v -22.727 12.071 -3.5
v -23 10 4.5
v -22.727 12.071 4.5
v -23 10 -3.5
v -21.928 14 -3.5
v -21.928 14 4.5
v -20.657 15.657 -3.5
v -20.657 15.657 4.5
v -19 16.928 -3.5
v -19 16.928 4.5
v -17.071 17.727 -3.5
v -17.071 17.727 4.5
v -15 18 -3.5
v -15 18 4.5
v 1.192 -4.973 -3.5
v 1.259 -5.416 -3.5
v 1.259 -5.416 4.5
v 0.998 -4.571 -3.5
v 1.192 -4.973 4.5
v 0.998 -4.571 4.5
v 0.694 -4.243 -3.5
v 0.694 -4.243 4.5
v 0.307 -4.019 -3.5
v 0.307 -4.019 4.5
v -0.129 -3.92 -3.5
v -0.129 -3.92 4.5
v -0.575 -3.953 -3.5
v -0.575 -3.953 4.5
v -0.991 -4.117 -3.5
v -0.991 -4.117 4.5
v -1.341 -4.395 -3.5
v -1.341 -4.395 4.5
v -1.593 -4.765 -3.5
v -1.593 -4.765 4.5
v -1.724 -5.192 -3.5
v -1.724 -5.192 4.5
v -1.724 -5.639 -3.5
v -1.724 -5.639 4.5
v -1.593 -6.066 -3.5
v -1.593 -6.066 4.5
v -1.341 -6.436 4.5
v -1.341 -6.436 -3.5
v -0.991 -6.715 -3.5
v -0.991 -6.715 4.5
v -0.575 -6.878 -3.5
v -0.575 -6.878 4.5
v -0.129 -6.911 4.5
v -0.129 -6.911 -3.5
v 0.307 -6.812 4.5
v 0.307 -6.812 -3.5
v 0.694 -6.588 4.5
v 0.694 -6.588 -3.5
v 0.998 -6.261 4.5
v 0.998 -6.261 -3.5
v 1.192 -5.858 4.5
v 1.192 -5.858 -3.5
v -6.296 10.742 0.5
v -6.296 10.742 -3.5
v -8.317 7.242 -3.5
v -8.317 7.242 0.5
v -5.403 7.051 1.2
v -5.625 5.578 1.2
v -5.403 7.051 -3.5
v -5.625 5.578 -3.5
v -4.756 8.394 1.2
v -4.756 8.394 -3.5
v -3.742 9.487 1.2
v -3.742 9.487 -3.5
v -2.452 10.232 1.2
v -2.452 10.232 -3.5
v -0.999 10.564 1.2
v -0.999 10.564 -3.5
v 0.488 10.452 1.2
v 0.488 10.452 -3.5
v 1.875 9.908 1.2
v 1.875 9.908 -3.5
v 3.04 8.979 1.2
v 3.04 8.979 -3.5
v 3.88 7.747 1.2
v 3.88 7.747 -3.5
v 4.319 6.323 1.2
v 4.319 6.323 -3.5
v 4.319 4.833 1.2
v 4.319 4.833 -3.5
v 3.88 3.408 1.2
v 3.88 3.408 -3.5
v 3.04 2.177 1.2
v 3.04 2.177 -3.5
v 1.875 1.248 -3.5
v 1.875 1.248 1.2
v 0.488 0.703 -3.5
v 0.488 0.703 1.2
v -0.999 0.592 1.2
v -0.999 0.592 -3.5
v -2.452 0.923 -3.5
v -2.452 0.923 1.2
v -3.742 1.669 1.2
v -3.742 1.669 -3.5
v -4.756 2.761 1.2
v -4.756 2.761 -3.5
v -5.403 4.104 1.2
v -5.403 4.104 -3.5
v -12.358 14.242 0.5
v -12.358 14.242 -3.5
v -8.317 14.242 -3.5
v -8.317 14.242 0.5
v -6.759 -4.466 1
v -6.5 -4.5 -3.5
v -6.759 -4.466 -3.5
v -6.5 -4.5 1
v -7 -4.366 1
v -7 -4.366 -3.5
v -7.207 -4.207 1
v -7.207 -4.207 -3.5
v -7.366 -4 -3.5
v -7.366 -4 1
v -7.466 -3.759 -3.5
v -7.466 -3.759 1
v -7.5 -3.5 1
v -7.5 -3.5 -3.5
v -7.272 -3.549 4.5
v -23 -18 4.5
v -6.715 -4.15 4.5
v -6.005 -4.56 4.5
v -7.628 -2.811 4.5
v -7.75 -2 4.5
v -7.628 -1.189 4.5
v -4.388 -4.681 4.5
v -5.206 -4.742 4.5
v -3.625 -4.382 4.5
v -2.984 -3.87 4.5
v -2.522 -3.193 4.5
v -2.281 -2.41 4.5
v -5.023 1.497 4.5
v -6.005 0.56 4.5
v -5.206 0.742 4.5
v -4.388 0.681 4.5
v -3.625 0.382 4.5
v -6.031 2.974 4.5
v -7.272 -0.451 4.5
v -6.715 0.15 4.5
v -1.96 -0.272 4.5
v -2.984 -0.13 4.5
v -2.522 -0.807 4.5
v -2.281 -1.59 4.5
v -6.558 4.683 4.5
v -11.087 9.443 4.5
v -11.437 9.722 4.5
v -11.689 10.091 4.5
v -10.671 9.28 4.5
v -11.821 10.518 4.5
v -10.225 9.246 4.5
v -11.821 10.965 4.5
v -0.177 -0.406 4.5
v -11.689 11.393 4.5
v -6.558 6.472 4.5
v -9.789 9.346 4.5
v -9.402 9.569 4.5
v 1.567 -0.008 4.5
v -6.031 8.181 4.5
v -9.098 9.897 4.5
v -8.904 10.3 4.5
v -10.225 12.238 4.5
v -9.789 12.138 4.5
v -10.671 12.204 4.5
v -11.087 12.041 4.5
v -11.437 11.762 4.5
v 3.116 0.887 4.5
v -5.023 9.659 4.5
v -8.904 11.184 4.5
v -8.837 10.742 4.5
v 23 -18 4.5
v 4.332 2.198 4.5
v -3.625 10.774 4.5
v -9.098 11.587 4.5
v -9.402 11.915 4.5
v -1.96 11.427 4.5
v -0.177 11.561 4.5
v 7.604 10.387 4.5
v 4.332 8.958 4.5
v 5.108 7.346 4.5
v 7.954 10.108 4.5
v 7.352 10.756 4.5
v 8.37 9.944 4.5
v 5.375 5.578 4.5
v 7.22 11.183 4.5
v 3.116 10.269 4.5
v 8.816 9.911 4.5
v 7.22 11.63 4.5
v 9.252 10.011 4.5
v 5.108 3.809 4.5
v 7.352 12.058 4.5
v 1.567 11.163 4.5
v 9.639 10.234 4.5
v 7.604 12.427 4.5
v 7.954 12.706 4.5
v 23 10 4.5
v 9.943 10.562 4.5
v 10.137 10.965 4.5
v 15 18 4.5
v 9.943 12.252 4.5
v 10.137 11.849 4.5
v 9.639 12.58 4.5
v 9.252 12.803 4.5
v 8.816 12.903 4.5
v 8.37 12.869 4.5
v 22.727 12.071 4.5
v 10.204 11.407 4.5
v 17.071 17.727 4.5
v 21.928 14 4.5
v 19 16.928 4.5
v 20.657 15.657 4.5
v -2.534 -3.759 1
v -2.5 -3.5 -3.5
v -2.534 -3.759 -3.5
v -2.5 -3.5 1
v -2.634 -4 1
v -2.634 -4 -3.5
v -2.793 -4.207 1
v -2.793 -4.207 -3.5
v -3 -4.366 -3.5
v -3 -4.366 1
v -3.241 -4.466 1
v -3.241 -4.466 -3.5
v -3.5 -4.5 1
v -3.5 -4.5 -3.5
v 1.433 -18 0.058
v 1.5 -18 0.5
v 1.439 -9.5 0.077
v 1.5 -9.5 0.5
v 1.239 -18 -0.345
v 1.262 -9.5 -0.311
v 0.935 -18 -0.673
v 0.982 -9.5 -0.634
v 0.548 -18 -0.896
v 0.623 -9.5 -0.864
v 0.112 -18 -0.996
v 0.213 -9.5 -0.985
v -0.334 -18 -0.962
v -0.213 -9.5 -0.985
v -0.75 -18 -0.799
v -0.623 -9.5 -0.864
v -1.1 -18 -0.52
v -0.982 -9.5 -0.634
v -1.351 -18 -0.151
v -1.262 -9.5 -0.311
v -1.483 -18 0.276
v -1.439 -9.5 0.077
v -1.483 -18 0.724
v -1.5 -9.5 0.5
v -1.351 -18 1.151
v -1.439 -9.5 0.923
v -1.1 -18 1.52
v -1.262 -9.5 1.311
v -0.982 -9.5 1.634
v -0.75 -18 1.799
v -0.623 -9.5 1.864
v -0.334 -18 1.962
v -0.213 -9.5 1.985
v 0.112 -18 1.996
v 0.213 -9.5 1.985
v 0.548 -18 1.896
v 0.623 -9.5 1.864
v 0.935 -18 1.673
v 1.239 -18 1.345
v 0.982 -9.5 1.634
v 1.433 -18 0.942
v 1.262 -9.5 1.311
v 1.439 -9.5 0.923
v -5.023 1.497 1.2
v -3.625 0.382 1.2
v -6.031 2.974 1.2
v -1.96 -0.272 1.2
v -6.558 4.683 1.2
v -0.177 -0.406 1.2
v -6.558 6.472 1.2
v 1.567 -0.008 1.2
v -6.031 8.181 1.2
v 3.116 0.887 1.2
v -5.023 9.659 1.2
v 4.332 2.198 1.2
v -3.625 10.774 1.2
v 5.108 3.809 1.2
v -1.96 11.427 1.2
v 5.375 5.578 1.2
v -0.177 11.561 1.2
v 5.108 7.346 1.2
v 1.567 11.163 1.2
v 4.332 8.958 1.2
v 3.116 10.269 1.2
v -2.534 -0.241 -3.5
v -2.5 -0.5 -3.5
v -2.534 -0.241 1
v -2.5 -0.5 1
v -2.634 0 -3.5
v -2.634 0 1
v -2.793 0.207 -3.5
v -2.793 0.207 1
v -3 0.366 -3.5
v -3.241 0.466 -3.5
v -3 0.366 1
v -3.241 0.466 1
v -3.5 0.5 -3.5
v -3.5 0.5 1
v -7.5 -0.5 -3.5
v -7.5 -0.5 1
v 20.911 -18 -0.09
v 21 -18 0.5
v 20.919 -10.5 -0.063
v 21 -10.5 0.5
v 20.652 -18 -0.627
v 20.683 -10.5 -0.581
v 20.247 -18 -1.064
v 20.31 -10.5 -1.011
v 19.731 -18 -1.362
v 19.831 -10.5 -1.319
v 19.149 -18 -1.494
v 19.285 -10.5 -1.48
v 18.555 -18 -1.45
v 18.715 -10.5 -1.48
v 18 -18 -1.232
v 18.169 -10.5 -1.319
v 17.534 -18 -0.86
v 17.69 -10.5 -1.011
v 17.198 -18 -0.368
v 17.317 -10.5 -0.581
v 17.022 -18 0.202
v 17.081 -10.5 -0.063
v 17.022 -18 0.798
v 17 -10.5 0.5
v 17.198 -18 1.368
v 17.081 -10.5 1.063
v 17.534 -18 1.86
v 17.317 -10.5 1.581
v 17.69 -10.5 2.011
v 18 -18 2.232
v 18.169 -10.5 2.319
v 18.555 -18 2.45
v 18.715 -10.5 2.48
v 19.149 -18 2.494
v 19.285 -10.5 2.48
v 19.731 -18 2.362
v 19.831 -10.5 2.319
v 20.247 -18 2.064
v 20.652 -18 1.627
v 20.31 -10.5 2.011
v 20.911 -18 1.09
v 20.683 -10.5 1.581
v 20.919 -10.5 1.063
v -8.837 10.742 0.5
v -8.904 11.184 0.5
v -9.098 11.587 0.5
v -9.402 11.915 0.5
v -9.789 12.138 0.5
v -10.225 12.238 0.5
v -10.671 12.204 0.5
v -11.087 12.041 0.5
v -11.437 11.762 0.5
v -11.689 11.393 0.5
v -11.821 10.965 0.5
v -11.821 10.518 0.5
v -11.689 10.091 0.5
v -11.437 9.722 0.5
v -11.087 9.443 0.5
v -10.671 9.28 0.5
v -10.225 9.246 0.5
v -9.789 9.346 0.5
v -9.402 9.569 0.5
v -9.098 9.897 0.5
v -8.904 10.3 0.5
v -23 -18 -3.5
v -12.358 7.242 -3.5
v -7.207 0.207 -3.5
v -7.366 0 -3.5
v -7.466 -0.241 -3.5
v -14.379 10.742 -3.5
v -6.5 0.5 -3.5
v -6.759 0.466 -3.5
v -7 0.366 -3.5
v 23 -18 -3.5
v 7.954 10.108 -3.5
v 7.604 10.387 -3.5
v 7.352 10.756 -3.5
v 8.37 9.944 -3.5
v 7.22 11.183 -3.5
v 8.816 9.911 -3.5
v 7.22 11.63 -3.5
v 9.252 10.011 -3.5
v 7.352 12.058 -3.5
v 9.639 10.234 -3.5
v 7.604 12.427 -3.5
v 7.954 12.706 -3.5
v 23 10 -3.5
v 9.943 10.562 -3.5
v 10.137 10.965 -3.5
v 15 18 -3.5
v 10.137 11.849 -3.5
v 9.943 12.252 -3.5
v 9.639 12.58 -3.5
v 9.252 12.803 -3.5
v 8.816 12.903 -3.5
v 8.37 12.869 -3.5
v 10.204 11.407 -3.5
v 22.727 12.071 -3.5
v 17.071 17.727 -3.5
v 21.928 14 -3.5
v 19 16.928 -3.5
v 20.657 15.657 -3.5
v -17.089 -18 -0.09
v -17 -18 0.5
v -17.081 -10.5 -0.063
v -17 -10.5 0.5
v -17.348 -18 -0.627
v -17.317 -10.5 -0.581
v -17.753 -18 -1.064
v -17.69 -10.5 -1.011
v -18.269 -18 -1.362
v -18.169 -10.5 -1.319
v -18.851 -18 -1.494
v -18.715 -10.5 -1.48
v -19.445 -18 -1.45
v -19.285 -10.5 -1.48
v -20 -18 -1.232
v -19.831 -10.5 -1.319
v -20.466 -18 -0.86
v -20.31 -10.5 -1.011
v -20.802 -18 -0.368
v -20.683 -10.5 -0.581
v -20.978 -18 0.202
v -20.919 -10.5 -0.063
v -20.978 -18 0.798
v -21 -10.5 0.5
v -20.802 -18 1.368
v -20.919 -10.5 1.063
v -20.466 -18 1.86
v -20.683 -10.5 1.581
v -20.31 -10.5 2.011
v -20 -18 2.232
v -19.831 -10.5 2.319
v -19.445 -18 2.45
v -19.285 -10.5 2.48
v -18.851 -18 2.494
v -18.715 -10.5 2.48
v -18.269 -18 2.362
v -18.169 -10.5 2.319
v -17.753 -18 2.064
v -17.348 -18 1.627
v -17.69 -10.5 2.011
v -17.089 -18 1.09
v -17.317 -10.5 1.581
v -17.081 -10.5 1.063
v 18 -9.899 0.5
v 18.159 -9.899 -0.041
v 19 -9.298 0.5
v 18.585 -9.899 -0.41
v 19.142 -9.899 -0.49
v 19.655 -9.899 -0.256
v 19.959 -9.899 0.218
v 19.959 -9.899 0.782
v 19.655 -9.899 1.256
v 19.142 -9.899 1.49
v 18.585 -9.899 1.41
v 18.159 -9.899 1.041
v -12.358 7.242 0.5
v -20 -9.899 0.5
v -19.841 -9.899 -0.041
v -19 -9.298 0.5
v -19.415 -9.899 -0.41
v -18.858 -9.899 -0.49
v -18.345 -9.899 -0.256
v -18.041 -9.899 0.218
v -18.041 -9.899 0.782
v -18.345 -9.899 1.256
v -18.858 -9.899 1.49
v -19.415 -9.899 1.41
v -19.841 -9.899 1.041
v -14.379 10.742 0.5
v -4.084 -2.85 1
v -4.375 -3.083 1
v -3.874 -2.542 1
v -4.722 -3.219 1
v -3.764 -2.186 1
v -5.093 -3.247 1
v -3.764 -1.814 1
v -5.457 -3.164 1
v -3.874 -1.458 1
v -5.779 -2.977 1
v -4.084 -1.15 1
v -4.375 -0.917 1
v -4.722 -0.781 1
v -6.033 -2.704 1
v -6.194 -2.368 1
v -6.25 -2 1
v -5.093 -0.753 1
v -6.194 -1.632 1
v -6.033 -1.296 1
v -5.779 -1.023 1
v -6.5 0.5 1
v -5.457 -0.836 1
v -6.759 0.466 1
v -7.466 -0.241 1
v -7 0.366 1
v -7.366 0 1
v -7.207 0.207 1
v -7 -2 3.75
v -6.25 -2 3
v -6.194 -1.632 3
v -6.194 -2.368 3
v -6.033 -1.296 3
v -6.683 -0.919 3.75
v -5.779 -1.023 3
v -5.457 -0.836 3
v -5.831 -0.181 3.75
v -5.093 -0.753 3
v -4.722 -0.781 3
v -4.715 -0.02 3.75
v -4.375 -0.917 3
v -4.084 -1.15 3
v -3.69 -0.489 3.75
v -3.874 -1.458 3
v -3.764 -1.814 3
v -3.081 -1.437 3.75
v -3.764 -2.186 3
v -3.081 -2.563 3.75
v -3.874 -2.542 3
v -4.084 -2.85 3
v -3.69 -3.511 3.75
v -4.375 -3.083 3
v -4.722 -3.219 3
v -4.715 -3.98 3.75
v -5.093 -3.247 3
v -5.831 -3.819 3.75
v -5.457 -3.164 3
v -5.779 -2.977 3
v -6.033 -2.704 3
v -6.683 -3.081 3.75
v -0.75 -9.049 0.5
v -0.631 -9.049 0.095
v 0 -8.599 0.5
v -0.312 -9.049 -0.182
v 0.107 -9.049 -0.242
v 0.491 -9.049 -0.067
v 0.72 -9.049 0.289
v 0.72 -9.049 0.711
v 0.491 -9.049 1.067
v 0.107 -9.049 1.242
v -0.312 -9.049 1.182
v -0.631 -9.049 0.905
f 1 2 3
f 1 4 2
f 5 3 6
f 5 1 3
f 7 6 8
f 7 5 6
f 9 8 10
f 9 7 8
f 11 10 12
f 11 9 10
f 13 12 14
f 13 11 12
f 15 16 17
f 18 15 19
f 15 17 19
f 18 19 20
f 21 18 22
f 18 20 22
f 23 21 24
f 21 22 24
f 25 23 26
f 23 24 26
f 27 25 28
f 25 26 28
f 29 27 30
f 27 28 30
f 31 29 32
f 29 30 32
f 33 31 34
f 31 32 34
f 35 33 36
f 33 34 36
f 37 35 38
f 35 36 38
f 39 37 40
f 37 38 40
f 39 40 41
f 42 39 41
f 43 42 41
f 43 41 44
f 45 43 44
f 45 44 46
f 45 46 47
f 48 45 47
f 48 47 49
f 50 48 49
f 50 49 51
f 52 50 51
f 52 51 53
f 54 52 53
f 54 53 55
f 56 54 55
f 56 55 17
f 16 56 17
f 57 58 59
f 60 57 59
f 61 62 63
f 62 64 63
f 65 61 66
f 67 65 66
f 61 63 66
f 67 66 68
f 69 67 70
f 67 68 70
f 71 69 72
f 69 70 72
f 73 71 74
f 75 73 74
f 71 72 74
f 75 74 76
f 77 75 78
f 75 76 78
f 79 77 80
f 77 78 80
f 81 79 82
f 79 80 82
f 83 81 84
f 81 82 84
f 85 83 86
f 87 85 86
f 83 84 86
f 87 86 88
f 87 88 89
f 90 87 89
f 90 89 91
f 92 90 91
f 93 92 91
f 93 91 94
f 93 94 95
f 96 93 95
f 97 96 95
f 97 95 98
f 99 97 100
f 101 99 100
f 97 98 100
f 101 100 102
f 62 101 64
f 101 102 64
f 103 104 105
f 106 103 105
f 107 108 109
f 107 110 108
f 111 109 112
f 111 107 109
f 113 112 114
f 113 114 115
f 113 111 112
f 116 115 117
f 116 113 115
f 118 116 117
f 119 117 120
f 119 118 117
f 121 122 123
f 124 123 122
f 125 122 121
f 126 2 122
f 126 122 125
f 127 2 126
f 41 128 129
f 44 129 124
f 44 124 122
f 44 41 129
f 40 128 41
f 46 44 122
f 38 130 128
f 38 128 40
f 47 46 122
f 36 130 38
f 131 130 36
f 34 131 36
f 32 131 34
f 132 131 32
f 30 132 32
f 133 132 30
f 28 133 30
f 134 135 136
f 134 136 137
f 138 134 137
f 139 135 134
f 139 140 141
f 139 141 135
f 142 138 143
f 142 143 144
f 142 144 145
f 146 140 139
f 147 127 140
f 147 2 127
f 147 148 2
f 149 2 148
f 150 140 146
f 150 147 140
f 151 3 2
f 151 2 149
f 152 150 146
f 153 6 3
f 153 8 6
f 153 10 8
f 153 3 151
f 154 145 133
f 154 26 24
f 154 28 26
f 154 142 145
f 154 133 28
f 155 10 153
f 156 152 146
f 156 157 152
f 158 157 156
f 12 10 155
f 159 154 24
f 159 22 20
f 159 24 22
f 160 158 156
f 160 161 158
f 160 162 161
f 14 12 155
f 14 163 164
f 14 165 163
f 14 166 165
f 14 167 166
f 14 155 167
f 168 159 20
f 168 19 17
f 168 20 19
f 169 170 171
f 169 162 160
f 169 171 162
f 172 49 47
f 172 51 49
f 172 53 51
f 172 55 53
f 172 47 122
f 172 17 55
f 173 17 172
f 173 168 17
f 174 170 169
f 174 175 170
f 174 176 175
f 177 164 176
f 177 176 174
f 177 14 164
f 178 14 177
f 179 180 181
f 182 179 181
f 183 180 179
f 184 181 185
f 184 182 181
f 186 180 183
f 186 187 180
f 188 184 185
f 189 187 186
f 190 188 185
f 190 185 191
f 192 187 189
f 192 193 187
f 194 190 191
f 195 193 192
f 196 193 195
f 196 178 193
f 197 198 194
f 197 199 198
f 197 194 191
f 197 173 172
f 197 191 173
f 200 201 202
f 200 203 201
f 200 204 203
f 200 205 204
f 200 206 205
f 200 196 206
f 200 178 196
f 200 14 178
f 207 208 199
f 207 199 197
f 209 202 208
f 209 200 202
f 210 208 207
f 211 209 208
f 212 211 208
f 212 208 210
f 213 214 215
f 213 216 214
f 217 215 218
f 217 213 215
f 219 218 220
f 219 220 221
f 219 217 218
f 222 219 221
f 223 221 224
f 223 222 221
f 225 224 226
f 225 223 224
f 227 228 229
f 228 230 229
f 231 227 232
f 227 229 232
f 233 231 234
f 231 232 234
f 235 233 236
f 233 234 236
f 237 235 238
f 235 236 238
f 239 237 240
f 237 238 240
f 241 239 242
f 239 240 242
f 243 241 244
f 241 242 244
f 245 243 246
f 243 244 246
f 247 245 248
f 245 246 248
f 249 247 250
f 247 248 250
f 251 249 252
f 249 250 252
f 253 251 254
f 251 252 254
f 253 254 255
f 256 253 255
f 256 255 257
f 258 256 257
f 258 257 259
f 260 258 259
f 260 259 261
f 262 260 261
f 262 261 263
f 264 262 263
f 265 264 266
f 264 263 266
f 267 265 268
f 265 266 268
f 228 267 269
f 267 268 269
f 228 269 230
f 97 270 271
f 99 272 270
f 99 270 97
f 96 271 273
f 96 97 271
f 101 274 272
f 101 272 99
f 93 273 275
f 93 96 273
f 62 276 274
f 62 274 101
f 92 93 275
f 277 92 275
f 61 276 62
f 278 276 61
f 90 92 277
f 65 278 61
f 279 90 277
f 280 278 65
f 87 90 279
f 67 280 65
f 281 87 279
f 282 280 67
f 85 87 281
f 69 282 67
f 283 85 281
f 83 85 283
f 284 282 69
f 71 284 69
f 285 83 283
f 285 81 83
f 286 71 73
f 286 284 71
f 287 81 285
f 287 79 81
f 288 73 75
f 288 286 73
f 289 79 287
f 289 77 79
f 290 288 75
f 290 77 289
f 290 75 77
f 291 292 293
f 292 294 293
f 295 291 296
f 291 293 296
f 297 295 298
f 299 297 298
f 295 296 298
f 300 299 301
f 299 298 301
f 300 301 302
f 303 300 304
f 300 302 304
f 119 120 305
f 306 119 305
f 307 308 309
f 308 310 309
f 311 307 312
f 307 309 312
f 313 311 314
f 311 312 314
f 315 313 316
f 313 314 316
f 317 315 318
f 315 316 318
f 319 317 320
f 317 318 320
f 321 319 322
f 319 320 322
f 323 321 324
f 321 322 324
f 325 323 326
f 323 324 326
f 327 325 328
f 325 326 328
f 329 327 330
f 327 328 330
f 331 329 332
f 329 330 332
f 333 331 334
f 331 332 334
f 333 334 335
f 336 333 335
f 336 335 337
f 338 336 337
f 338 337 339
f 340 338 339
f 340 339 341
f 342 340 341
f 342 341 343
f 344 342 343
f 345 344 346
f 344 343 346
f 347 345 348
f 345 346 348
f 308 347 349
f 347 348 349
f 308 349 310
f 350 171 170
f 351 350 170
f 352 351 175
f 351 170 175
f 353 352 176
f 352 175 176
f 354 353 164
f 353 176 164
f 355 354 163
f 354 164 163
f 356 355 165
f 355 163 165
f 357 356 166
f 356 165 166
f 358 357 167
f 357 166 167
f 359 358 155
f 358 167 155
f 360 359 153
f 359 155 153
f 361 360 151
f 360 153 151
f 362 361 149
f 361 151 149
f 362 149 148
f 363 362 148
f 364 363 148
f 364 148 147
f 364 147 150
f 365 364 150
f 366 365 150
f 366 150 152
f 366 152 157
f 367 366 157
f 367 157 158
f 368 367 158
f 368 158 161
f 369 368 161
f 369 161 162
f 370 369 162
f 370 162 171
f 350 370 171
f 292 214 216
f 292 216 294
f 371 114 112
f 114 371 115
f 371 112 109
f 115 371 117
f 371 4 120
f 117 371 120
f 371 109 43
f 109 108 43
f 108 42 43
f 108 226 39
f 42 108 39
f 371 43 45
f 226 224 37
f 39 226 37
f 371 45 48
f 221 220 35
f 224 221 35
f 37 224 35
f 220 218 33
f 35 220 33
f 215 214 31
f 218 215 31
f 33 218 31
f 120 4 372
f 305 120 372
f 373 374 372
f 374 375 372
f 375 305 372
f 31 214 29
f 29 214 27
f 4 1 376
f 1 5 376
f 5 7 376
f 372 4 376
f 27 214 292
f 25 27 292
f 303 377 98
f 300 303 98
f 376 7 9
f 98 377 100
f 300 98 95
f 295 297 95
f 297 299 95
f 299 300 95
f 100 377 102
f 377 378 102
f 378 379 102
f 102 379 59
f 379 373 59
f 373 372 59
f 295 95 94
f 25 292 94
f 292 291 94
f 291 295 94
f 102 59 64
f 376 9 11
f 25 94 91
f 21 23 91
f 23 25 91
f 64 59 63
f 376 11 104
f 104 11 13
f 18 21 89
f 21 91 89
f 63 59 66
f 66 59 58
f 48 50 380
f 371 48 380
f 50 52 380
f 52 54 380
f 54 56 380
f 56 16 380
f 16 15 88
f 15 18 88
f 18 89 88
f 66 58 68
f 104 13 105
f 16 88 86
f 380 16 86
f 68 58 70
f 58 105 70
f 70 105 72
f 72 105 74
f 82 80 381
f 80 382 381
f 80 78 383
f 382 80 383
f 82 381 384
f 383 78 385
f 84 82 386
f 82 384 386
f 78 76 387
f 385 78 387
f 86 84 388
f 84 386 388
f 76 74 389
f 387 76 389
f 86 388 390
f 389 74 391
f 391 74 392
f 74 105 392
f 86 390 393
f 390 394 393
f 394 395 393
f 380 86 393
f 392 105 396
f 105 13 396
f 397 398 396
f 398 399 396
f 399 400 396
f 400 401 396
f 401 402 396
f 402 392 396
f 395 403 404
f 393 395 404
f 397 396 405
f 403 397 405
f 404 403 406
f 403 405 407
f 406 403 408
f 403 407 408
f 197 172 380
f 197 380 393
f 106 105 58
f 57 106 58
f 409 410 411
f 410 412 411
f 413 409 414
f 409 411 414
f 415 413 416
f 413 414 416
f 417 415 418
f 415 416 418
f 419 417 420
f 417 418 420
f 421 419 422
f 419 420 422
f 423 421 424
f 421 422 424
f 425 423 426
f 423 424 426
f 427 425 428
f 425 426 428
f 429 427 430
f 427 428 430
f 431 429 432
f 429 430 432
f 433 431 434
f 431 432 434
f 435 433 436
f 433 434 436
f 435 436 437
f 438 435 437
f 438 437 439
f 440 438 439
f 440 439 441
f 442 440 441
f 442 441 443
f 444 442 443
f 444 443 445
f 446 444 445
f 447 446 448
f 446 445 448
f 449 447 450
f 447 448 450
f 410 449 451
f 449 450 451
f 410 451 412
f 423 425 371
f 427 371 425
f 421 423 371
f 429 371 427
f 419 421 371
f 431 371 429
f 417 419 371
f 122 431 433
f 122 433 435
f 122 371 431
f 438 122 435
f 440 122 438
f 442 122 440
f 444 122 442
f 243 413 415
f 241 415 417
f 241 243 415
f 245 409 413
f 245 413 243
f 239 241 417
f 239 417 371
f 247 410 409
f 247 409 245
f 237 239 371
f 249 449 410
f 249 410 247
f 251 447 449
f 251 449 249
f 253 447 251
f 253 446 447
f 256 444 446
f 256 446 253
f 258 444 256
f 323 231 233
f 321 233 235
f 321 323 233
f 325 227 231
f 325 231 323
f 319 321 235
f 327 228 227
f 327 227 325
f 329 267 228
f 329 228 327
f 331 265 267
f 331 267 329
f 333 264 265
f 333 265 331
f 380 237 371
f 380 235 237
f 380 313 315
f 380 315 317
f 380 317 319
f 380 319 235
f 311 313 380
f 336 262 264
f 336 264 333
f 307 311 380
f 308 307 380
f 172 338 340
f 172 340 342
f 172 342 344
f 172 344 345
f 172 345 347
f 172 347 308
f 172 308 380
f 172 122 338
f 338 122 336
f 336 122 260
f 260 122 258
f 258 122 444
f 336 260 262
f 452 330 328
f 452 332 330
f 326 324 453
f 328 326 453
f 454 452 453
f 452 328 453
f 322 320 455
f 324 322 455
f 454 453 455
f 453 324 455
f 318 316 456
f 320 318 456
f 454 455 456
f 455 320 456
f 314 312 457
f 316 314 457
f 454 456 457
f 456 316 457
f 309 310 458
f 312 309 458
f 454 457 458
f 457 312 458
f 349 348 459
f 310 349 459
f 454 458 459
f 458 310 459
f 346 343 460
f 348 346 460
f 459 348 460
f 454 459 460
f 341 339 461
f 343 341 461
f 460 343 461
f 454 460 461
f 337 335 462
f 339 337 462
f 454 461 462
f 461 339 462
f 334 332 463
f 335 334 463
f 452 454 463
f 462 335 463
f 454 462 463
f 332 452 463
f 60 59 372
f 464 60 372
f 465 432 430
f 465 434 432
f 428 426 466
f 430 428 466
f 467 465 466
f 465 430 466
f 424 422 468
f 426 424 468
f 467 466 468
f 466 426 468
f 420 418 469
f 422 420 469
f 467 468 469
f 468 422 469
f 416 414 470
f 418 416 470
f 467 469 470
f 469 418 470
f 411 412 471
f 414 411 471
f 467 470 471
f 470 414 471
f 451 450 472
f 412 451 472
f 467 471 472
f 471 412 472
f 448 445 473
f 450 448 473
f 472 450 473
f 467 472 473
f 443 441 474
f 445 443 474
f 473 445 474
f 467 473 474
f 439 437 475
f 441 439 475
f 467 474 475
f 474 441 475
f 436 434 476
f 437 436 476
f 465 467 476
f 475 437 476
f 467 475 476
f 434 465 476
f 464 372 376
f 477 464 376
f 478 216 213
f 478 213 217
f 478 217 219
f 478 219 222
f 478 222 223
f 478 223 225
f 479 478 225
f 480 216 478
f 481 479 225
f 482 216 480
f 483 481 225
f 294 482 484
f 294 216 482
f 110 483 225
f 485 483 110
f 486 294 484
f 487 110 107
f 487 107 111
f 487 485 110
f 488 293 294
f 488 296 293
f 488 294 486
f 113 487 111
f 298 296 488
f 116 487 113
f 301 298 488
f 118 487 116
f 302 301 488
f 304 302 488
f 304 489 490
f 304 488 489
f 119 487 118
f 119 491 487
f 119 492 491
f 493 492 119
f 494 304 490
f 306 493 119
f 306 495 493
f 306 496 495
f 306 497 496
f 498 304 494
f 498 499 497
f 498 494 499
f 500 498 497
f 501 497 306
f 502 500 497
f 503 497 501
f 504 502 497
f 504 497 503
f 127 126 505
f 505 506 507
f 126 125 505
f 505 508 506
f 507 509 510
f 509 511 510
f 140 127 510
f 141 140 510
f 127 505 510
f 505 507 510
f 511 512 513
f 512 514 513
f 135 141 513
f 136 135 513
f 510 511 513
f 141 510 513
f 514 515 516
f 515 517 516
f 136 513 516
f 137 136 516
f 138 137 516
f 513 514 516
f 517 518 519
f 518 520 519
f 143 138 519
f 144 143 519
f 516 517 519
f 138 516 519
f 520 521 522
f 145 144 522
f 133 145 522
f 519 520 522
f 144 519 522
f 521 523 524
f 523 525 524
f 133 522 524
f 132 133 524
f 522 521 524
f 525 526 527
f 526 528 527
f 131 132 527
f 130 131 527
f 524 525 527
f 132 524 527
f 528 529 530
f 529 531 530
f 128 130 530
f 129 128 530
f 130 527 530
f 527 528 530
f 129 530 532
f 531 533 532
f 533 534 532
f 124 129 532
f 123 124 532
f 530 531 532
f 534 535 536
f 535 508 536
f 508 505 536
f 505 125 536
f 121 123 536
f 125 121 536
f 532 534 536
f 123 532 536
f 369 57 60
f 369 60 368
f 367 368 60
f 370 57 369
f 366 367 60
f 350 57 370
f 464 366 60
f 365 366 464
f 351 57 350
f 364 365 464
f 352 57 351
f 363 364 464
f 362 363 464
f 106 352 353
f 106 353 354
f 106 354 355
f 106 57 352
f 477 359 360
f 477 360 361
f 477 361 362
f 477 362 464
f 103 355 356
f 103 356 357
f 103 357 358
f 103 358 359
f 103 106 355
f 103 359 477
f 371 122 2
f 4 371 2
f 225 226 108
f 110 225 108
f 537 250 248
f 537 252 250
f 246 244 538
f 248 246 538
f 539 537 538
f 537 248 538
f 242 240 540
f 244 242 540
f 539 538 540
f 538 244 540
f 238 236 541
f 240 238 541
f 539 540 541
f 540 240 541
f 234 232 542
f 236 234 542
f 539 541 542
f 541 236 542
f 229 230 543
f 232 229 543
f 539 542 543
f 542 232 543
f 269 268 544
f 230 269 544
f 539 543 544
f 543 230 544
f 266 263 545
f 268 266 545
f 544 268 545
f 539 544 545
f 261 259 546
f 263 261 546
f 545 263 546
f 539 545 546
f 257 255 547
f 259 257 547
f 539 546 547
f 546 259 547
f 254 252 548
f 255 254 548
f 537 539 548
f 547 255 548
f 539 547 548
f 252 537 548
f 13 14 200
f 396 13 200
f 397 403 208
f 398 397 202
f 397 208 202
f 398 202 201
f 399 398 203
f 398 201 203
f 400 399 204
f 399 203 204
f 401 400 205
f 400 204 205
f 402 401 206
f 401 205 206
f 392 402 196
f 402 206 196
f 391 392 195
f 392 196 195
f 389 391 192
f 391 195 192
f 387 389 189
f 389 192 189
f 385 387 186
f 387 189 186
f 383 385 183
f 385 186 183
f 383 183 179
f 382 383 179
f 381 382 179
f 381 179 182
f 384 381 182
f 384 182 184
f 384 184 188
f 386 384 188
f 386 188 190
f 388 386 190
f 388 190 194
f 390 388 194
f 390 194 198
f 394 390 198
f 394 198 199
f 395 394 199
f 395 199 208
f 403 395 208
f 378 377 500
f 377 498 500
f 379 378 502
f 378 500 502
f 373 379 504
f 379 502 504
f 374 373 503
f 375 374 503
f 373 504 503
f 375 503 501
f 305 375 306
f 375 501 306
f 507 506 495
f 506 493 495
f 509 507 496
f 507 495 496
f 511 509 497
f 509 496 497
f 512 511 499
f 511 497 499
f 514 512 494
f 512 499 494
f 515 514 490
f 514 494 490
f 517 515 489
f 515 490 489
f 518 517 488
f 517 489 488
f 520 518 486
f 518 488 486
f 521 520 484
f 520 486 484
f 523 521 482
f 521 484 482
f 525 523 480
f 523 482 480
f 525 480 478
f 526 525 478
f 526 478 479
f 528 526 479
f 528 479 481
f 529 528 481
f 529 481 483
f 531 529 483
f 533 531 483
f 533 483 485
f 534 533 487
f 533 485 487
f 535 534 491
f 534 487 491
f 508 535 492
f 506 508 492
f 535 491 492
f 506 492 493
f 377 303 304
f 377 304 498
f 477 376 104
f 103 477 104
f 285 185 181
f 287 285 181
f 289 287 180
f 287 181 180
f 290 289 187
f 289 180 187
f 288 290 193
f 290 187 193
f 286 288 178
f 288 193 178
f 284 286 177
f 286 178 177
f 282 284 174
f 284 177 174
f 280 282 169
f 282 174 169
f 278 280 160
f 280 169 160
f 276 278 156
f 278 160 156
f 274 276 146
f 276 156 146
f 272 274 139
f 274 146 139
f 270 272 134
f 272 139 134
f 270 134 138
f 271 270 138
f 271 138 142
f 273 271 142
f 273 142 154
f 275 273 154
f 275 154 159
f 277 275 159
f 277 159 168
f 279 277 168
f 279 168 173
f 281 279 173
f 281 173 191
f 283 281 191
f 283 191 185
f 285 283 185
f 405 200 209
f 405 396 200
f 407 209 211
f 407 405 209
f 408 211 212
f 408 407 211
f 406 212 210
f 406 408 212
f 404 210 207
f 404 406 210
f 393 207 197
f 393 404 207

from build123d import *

# Parameters (mm, degrees)
SKETCH1_W                                         = 46
SKETCH1_H                                         = 36
BOSS_EXTRUDE1_DEPTH                               = 8
F_3_0MM_DOWEL_HOLE1_D                             = 3
F_3_0MM_DOWEL_HOLE1_DEPTH                         = 8.5
F_3_0MM_DOWEL_HOLE1_TIP                           = 0.901290929
F_4_0MM_DOWEL_HOLE1_D                             = 4
F_4_0MM_DOWEL_HOLE1_DEPTH                         = 7.5
F_4_0MM_DOWEL_HOLE1_TIP                           = 1.201721238
FILLET2_R                                         = 8
SKETCH16_W                                        = 5
SKETCH16_H                                        = 5
CUT_EXTRUDE1_DEPTH                                = 4.5
CSK_FOR_M2_5_FLAT_HEAD_MACHINE_SCREW1_D           = 2.5
CSK_FOR_M2_5_FLAT_HEAD_MACHINE_SCREW1_DEPTH       = 9.5
CSK_FOR_M2_5_FLAT_HEAD_MACHINE_SCREW1_CSINK_D     = 5.5
CSK_FOR_M2_5_FLAT_HEAD_MACHINE_SCREW1_CSINK_ANGLE = 90
CSK_FOR_M2_5_FLAT_HEAD_MACHINE_SCREW1_TIP         = 0.751075774
HOLE1_D                                           = 10
HOLE1_CBORE_D                                     = 12
HOLE1_CBORE_DEPTH                                 = 3.3
F_3_0_3_DIAMETER_HOLE1_D                          = 3
FILLET3_R                                         = 1
CUT_EXTRUDE2_DEPTH                                = 4


with BuildPart() as part:
    # Sketch1 → Boss-Extrude1 (new body)
    with BuildSketch(Plane.XY.offset(4.5)):
        Rectangle(SKETCH1_W, SKETCH1_H)
    extrude(amount=-BOSS_EXTRUDE1_DEPTH)

    # Ø3.0mm Dowel Hole1
    with Locations(Plane(origin=(0, -18, 0), x_dir=(-1, 0, 0), z_dir=(0, -1, 0))):
        with Locations((0, -0.5)):
            Hole(F_3_0MM_DOWEL_HOLE1_D / 2, depth=F_3_0MM_DOWEL_HOLE1_DEPTH)
            with Locations((0, 0, -(F_3_0MM_DOWEL_HOLE1_DEPTH + F_3_0MM_DOWEL_HOLE1_TIP / 2))):  # 118° drill point
                Cone(0, F_3_0MM_DOWEL_HOLE1_D / 2, F_3_0MM_DOWEL_HOLE1_TIP, mode=Mode.SUBTRACT)

    # Ø4.0mm Dowel Hole1
    with Locations(Plane(origin=(0, -18, 0), x_dir=(-1, 0, 0), z_dir=(0, -1, 0))):
        with Locations((19, -0.5), (-19, -0.5)):
            Hole(F_4_0MM_DOWEL_HOLE1_D / 2, depth=F_4_0MM_DOWEL_HOLE1_DEPTH)
            with Locations((0, 0, -(F_4_0MM_DOWEL_HOLE1_DEPTH + F_4_0MM_DOWEL_HOLE1_TIP / 2))):  # 118° drill point
                Cone(0, F_4_0MM_DOWEL_HOLE1_D / 2, F_4_0MM_DOWEL_HOLE1_TIP, mode=Mode.SUBTRACT)

    # Fillet2
    fillet2_edges = [part.edges().sort_by_distance(p)[0] for p in [
        (-23, 18, 0.5),
        (23, 18, 0.5),
    ]]
    fillet(fillet2_edges, radius=FILLET2_R)

    # Sketch16 → Cut-Extrude1 (cut)
    with BuildSketch(Plane(origin=(0, 0, -3.5), x_dir=(-1, 0, 0), z_dir=(0, 0, -1))):
        with Locations((5, -2)):
            Rectangle(SKETCH16_W, SKETCH16_H)
    extrude(amount=-CUT_EXTRUDE1_DEPTH, mode=Mode.SUBTRACT)

    # CSK for M2.5 Flat Head Machine Screw1
    with Locations(Plane(origin=(-5, -2, 4.5), x_dir=(1, 0, 0), z_dir=(0, 0, 1))):
        with Locations((0, 0)):
            CounterSinkHole(CSK_FOR_M2_5_FLAT_HEAD_MACHINE_SCREW1_D / 2, CSK_FOR_M2_5_FLAT_HEAD_MACHINE_SCREW1_CSINK_D / 2, depth=CSK_FOR_M2_5_FLAT_HEAD_MACHINE_SCREW1_DEPTH, counter_sink_angle=CSK_FOR_M2_5_FLAT_HEAD_MACHINE_SCREW1_CSINK_ANGLE)
            with Locations((0, 0, -(CSK_FOR_M2_5_FLAT_HEAD_MACHINE_SCREW1_DEPTH + CSK_FOR_M2_5_FLAT_HEAD_MACHINE_SCREW1_TIP / 2))):  # 118° drill point
                Cone(0, CSK_FOR_M2_5_FLAT_HEAD_MACHINE_SCREW1_D / 2, CSK_FOR_M2_5_FLAT_HEAD_MACHINE_SCREW1_TIP, mode=Mode.SUBTRACT)

    # Hole1 (through all)
    with Locations(Plane.XY.offset(4.5)):
        with Locations((-0.625, 5.577722283)):
            CounterBoreHole(HOLE1_D / 2, HOLE1_CBORE_D / 2, HOLE1_CBORE_DEPTH)

    # Ø3.0 (3) Diameter Hole1 (through all)
    with Locations(Plane(origin=(0, 0, -3.5), x_dir=(-1, 0, 0), z_dir=(0, 0, -1))):
        with Locations((-8.703529058, 11.40683419), (10.337423522, 10.741909474), (0.241105536, -5.415576814)):
            Hole(F_3_0_3_DIAMETER_HOLE1_D / 2)

    # Fillet3
    fillet3_edges = [part.edges().sort_by_distance(p)[0] for p in [
        (-7.5, 0.5, -1.25),
        (-7.5, -4.5, -1.25),
        (-2.5, -4.5, -1.25),
        (-2.5, 0.5, -1.25),
    ]]
    fillet(fillet3_edges, radius=FILLET3_R)

    # Sketch20 → Cut-Extrude2 (cut)
    with BuildSketch(Plane(origin=(0, 0, -3.5), x_dir=(-1, 0, 0), z_dir=(0, 0, -1))):
        Polygon((14.378875406, 10.741909474), (12.358149464, 14.241909474), (8.316697579, 14.241909474), (6.295971637, 10.741909474), (8.316697579, 7.241909474), (12.358149464, 7.241909474), align=None)
    extrude(amount=-CUT_EXTRUDE2_DEPTH, mode=Mode.SUBTRACT)


solid = part.part
